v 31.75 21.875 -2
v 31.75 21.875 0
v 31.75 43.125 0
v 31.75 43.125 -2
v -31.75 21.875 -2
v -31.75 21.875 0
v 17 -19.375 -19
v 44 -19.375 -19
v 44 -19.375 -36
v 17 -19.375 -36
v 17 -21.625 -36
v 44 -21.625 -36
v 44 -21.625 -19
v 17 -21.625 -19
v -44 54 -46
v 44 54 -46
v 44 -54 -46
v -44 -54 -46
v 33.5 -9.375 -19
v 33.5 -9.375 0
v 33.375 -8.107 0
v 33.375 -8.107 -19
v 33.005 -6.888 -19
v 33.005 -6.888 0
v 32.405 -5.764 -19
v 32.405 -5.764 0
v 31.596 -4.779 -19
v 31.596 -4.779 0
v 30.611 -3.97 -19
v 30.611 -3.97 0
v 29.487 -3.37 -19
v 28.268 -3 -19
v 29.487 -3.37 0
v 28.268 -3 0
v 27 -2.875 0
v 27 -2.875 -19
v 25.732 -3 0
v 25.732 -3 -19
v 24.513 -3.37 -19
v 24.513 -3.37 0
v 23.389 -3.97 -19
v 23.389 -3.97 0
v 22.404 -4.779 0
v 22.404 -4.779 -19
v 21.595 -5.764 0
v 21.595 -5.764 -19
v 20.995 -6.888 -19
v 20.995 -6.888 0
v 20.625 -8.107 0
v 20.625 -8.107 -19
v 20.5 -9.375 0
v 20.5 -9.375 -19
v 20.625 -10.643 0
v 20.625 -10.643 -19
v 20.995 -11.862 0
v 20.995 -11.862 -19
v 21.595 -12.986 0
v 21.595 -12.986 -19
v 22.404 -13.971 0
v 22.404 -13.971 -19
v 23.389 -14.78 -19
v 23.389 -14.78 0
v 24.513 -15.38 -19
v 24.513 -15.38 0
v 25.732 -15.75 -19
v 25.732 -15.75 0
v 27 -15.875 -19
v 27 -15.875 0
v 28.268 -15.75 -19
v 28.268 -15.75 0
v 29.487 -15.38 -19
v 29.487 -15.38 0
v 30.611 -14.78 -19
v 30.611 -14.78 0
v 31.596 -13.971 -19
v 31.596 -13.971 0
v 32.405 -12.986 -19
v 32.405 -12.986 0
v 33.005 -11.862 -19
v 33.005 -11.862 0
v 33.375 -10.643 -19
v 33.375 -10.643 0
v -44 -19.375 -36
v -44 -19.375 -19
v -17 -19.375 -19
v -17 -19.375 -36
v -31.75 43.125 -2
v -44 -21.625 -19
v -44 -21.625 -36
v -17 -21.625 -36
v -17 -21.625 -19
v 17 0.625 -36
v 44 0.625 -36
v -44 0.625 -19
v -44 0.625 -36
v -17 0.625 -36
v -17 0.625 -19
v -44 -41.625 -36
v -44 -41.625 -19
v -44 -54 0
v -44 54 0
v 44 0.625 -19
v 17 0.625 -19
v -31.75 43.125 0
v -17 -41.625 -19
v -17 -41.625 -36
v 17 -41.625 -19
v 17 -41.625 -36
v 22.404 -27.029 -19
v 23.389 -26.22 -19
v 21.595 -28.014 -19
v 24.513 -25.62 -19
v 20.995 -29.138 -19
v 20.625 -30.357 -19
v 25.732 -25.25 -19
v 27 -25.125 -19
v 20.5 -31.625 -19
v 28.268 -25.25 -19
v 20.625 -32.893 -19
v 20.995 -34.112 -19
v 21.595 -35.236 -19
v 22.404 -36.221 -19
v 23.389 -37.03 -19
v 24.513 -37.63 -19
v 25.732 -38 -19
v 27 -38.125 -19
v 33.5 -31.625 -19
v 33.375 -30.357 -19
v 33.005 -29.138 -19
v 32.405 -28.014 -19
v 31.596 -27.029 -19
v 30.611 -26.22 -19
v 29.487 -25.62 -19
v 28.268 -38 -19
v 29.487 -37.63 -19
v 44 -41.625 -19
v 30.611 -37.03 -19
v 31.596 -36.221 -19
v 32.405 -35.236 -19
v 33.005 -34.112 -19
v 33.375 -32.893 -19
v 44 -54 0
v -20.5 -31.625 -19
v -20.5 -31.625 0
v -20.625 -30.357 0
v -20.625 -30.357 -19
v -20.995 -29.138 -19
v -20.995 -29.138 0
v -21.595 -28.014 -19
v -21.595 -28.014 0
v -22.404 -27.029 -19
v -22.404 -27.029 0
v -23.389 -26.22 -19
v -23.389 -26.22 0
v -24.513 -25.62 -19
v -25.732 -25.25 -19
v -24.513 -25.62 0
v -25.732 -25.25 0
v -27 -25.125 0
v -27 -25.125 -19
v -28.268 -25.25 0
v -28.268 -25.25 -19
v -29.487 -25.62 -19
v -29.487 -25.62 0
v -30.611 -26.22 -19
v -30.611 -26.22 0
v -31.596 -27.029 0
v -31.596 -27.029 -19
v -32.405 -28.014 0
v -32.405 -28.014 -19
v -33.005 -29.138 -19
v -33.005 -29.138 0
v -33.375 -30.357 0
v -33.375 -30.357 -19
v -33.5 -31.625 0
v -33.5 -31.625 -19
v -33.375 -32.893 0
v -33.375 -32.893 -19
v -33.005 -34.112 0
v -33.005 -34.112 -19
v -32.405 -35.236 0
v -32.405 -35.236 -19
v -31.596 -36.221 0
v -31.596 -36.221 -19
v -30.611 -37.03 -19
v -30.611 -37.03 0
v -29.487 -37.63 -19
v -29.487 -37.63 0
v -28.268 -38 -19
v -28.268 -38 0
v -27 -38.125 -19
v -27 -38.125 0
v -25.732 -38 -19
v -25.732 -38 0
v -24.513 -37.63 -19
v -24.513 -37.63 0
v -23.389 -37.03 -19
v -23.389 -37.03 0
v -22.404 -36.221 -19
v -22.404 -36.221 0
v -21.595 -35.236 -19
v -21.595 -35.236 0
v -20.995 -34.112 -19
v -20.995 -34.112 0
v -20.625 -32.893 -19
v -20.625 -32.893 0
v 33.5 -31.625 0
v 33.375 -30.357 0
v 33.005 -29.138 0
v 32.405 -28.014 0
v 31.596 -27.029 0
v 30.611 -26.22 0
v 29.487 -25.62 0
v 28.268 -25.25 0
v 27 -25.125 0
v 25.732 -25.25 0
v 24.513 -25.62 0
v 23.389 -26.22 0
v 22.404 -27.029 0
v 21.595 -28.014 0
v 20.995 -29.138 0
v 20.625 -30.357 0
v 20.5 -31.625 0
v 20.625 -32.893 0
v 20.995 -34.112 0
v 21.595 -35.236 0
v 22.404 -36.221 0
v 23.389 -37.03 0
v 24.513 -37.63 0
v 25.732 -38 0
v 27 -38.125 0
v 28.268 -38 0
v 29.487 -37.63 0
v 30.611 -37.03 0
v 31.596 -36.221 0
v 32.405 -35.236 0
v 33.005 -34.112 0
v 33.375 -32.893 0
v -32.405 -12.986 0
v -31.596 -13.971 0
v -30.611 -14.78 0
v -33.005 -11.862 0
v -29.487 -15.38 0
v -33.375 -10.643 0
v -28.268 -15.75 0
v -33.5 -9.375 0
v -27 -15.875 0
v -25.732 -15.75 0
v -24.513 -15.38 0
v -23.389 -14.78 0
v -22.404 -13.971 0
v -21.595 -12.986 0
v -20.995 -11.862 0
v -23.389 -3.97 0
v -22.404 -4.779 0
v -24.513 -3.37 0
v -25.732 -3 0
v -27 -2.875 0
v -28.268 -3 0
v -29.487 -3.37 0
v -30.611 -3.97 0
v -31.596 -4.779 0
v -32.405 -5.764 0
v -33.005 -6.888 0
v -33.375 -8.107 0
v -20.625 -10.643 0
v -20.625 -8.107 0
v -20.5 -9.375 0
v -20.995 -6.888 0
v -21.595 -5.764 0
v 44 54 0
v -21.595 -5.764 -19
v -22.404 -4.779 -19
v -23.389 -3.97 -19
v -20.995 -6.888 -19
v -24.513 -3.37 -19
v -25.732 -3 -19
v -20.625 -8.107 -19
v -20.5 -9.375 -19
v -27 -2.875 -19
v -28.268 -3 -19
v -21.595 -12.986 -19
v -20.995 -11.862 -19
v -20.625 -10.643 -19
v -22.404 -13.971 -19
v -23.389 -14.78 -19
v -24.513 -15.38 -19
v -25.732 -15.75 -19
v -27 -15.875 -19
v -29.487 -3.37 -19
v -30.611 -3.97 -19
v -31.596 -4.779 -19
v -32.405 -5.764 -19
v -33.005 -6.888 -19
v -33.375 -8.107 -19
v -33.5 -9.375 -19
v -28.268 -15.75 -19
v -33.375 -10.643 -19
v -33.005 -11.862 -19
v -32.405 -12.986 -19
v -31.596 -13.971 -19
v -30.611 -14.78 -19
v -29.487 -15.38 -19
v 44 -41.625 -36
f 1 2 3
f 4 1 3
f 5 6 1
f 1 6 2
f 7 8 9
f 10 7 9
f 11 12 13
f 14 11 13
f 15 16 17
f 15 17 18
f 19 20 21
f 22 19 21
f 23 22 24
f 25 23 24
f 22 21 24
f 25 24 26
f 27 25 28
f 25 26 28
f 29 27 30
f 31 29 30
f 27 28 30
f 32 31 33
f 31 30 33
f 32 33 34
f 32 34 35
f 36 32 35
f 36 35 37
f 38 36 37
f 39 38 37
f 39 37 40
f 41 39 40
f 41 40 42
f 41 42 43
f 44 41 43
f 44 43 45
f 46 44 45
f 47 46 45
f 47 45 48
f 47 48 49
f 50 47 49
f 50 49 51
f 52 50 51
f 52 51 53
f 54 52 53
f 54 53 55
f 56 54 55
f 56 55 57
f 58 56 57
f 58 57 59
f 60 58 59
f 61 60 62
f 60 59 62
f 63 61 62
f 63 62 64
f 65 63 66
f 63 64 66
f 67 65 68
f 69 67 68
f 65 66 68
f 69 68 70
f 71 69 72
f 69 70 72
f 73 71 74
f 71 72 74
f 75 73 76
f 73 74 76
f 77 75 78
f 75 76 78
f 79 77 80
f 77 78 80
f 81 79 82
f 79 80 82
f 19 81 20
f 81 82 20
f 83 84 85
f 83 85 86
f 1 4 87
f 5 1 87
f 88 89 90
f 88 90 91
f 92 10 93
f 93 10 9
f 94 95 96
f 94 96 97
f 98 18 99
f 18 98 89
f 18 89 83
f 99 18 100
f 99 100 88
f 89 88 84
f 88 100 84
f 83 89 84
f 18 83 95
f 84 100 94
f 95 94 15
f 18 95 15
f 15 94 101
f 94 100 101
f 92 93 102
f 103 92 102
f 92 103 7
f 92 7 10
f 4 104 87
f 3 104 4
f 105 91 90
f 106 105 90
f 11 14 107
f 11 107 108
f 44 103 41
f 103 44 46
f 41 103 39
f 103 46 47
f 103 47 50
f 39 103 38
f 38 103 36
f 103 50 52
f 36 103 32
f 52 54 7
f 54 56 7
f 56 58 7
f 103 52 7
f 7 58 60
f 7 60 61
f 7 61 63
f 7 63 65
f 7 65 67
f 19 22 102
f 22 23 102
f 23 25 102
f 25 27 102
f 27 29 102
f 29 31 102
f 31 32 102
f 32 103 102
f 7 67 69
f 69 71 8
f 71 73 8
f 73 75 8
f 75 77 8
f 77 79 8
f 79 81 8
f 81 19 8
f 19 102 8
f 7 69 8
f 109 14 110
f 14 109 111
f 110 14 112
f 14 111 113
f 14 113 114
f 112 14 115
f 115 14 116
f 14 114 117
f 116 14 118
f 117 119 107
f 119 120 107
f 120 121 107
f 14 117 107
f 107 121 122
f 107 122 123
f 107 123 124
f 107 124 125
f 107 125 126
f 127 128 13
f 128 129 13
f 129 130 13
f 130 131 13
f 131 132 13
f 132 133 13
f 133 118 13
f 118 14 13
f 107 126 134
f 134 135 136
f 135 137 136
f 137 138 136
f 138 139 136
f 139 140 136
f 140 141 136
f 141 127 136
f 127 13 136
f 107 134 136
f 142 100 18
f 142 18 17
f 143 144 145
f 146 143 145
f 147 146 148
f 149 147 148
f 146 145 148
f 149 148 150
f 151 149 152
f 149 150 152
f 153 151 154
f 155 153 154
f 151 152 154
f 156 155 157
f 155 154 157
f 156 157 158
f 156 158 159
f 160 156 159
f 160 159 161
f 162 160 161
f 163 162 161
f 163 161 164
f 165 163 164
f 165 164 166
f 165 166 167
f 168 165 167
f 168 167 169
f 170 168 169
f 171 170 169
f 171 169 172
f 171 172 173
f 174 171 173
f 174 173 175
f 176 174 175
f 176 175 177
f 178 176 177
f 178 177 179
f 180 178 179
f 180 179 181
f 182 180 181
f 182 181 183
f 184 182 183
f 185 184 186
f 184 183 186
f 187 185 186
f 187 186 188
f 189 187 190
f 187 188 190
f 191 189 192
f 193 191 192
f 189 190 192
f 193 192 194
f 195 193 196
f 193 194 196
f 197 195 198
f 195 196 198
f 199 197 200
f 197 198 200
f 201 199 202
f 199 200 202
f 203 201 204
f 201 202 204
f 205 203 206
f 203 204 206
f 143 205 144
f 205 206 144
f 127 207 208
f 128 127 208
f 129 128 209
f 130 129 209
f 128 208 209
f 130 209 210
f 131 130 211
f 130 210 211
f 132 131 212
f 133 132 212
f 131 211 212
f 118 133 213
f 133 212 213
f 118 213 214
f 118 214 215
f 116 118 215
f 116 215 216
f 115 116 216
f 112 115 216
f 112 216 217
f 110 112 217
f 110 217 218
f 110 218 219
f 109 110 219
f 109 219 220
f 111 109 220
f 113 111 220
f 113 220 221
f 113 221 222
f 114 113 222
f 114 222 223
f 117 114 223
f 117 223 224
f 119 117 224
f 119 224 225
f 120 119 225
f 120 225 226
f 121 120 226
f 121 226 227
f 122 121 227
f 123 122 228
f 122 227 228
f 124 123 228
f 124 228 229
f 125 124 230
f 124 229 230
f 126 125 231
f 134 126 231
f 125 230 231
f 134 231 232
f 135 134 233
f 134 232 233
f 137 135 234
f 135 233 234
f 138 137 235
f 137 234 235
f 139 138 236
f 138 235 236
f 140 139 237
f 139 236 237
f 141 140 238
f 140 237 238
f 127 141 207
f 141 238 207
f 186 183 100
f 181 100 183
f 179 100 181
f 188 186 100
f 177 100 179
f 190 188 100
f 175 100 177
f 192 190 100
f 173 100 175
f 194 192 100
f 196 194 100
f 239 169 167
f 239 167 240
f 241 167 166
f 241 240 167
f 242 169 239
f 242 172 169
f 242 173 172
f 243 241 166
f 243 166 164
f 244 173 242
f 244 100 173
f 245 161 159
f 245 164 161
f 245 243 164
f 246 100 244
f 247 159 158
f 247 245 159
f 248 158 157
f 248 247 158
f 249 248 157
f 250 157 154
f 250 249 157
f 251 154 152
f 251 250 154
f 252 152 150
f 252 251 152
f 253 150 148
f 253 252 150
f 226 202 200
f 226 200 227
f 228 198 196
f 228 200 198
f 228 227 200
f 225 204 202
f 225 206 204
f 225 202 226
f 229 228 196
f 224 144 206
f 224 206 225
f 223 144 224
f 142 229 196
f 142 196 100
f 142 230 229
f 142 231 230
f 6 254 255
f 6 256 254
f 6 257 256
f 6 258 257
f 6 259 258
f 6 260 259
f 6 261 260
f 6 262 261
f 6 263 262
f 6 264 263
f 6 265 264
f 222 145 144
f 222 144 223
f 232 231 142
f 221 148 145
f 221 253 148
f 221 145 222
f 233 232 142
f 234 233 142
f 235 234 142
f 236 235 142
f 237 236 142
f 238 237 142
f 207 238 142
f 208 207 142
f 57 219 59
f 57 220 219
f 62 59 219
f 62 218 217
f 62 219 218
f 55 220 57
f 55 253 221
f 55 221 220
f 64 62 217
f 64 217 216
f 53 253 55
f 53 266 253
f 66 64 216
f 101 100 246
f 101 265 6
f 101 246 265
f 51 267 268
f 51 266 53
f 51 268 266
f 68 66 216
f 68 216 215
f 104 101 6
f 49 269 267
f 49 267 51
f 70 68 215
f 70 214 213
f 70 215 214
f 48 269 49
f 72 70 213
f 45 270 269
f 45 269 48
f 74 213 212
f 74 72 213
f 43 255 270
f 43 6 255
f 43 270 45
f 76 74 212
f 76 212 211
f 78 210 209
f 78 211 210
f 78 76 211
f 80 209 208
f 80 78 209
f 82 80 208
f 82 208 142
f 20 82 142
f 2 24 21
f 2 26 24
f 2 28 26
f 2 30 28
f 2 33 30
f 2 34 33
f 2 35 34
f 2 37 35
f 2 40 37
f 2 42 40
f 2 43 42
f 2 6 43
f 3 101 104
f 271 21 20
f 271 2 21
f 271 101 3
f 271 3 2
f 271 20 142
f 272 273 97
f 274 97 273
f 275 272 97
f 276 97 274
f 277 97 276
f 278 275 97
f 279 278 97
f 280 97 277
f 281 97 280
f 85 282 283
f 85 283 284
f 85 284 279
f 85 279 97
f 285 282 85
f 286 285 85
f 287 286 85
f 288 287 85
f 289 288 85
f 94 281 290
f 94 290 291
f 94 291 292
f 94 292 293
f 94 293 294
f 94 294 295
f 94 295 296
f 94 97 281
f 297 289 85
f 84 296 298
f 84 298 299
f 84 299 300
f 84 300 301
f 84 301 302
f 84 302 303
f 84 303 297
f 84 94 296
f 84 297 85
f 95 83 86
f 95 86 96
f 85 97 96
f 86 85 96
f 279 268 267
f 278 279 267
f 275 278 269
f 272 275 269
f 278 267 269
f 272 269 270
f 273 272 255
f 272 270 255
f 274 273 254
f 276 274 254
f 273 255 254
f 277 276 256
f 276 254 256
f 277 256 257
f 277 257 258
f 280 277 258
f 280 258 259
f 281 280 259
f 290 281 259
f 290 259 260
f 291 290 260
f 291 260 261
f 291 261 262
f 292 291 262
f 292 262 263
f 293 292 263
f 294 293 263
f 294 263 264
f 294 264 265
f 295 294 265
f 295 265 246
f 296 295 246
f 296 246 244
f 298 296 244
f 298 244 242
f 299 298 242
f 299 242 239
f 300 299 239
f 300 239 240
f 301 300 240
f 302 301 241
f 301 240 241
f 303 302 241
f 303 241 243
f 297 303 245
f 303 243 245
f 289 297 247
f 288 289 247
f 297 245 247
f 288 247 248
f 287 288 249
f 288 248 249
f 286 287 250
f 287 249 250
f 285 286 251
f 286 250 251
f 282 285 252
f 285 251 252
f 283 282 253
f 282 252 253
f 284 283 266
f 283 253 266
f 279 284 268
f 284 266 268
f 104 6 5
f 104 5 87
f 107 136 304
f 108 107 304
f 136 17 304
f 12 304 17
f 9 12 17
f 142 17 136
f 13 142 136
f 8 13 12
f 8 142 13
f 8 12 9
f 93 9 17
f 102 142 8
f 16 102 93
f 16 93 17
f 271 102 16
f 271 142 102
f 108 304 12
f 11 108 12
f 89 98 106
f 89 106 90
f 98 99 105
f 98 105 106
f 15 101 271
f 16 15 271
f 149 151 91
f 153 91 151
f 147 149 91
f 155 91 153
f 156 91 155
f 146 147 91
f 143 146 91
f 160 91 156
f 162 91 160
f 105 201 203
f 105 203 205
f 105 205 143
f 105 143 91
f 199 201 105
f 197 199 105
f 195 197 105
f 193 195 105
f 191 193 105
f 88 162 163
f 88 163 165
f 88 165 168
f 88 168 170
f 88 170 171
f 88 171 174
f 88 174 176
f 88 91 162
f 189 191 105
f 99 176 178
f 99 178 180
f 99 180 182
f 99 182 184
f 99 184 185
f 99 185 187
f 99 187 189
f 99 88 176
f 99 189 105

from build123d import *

# Parameters (mm, degrees)
SKETCH2_W           = 87.999717
SKETCH2_H           = 108
SKETCH2_R           = 6.5
SKETCH2_W_2         = 63.5
SKETCH2_H_2         = 21.25
BOSS_EXTRUDE1_DEPTH = 46
SKETCH4_W           = 63.5
SKETCH4_H           = 21.25
BOSS_EXTRUDE2_DEPTH = 44
BOSS_EXTRUDE3_START = -10
SKETCH5_R           = 6.5
BOSS_EXTRUDE3_DEPTH = 10
CUT_EXTRUDE1_START  = 43.999859
SKETCH3_W           = 2
SKETCH3_H           = 20
CUT_EXTRUDE1_DEPTH  = 27
CUT_EXTRUDE2_START  = -43.999859
SKETCH3_3_W         = 2
SKETCH3_3_H         = 20
CUT_EXTRUDE2_DEPTH  = 27


with BuildPart() as part:
    # Sketch2 → Boss-Extrude1 (new body)
    with BuildSketch(Plane.XY):
        Rectangle(SKETCH2_W, SKETCH2_H)
        with Locations((-27, -9.375)):
            Circle(SKETCH2_R, mode=Mode.SUBTRACT)
        with Locations((27, -9.375)):
            Circle(SKETCH2_R, mode=Mode.SUBTRACT)
        with Locations((27, -31.625)):
            Circle(SKETCH2_R, mode=Mode.SUBTRACT)
        with Locations((-27, -31.625)):
            Circle(SKETCH2_R, mode=Mode.SUBTRACT)
        with Locations((0, 32.5)):
            Rectangle(SKETCH2_W_2, SKETCH2_H_2, mode=Mode.SUBTRACT)
    extrude(amount=-BOSS_EXTRUDE1_DEPTH)

    # Sketch4 → Boss-Extrude2 (add)
    with BuildSketch(Plane(origin=(0, 0, -46), x_dir=(-1, 0, 0), z_dir=(0, 0, -1))):
        with Locations((0, 32.5)):
            Rectangle(SKETCH4_W, SKETCH4_H)
    extrude(amount=-BOSS_EXTRUDE2_DEPTH)

    # Sketch5 → Boss-Extrude3 (add)
    with BuildSketch(Plane(origin=(0, 0, -46), x_dir=(-1, 0, 0), z_dir=(0, 0, -1)).offset(BOSS_EXTRUDE3_START)):
        with Locations(Location((-27, -9.375, 0), (0, 0, 180))):
            Circle(SKETCH5_R)
        with Locations(Location((-27, -31.625, 0), (0, 0, 180))):
            Circle(SKETCH5_R)
        with Locations(Location((27, -31.625, 0), (0, 0, 180))):
            Circle(SKETCH5_R)
        with Locations(Location((27, -9.375, 0), (0, 0, 180))):
            Circle(SKETCH5_R)
    extrude(amount=BOSS_EXTRUDE3_DEPTH)

    # Sketch3 → Cut-Extrude1 (cut)
    with BuildSketch(Plane(origin=(0, 0, 0), x_dir=(0, 0, -1), z_dir=(1, 0, 0)).offset(CUT_EXTRUDE1_START)):
        with BuildLine():
            Line((34, -1.125), (34, 0.625))
            Line((34, 0.625), (19, 0.625))
            Line((19, 0.625), (19, -19.375))
            Line((19, -19.375), (34, -19.375))
            Line((34, -19.375), (34, -17.625))
            ThreePointArc((34, -17.625), (27.5, -9.375), (34, -1.125))
        make_face()
        with Locations((35, -9.375)):
            Rectangle(SKETCH3_W, SKETCH3_H)
        with BuildLine():
            Line((34, -21.625), (19, -21.625))
            Line((19, -21.625), (19, -41.625))
            Line((19, -41.625), (34, -41.625))
            Line((34, -41.625), (34, -39.875))
            ThreePointArc((34, -39.875), (27.5, -31.625), (34, -23.375))
            Line((34, -23.375), (34, -21.625))
        make_face()
        with BuildLine():
            Line((34, -39.875), (34, -23.375))
            ThreePointArc((34, -23.375), (27.5, -31.625), (34, -39.875))
        make_face()
        with Locations((35, -31.625)):
            Rectangle(SKETCH3_W, SKETCH3_H)
        with BuildLine():
            Line((34, -17.625), (34, -1.125))
            ThreePointArc((34, -1.125), (27.5, -9.375), (34, -17.625))
        make_face()
    extrude(amount=-CUT_EXTRUDE1_DEPTH, mode=Mode.SUBTRACT)

    # Sketch3<3> → Cut-Extrude2 (cut)
    with BuildSketch(Plane(origin=(0, 0, 0), x_dir=(0, 0, -1), z_dir=(1, 0, 0)).offset(CUT_EXTRUDE2_START)):
        with BuildLine():
            Line((34, -1.125), (34, 0.625))
            Line((34, 0.625), (19, 0.625))
            Line((19, 0.625), (19, -19.375))
            Line((19, -19.375), (34, -19.375))
            Line((34, -19.375), (34, -17.625))
            ThreePointArc((34, -17.625), (27.5, -9.375), (34, -1.125))
        make_face()
        with BuildLine():
            Line((34, -17.625), (34, -1.125))
            ThreePointArc((34, -1.125), (27.5, -9.375), (34, -17.625))
        make_face()
        with Locations((35, -9.375)):
            Rectangle(SKETCH3_3_W, SKETCH3_3_H)
        with Locations((35, -31.625)):
            Rectangle(SKETCH3_3_W, SKETCH3_3_H)
        with BuildLine():
            Line((34, -39.875), (34, -23.375))
            ThreePointArc((34, -23.375), (27.5, -31.625), (34, -39.875))
        make_face()
        with BuildLine():
            Line((34, -21.625), (19, -21.625))
            Line((19, -21.625), (19, -41.625))
            Line((19, -41.625), (34, -41.625))
            Line((34, -41.625), (34, -39.875))
            ThreePointArc((34, -39.875), (27.5, -31.625), (34, -23.375))
            Line((34, -23.375), (34, -21.625))
        make_face()
    extrude(amount=CUT_EXTRUDE2_DEPTH, mode=Mode.SUBTRACT)


solid = part.part
